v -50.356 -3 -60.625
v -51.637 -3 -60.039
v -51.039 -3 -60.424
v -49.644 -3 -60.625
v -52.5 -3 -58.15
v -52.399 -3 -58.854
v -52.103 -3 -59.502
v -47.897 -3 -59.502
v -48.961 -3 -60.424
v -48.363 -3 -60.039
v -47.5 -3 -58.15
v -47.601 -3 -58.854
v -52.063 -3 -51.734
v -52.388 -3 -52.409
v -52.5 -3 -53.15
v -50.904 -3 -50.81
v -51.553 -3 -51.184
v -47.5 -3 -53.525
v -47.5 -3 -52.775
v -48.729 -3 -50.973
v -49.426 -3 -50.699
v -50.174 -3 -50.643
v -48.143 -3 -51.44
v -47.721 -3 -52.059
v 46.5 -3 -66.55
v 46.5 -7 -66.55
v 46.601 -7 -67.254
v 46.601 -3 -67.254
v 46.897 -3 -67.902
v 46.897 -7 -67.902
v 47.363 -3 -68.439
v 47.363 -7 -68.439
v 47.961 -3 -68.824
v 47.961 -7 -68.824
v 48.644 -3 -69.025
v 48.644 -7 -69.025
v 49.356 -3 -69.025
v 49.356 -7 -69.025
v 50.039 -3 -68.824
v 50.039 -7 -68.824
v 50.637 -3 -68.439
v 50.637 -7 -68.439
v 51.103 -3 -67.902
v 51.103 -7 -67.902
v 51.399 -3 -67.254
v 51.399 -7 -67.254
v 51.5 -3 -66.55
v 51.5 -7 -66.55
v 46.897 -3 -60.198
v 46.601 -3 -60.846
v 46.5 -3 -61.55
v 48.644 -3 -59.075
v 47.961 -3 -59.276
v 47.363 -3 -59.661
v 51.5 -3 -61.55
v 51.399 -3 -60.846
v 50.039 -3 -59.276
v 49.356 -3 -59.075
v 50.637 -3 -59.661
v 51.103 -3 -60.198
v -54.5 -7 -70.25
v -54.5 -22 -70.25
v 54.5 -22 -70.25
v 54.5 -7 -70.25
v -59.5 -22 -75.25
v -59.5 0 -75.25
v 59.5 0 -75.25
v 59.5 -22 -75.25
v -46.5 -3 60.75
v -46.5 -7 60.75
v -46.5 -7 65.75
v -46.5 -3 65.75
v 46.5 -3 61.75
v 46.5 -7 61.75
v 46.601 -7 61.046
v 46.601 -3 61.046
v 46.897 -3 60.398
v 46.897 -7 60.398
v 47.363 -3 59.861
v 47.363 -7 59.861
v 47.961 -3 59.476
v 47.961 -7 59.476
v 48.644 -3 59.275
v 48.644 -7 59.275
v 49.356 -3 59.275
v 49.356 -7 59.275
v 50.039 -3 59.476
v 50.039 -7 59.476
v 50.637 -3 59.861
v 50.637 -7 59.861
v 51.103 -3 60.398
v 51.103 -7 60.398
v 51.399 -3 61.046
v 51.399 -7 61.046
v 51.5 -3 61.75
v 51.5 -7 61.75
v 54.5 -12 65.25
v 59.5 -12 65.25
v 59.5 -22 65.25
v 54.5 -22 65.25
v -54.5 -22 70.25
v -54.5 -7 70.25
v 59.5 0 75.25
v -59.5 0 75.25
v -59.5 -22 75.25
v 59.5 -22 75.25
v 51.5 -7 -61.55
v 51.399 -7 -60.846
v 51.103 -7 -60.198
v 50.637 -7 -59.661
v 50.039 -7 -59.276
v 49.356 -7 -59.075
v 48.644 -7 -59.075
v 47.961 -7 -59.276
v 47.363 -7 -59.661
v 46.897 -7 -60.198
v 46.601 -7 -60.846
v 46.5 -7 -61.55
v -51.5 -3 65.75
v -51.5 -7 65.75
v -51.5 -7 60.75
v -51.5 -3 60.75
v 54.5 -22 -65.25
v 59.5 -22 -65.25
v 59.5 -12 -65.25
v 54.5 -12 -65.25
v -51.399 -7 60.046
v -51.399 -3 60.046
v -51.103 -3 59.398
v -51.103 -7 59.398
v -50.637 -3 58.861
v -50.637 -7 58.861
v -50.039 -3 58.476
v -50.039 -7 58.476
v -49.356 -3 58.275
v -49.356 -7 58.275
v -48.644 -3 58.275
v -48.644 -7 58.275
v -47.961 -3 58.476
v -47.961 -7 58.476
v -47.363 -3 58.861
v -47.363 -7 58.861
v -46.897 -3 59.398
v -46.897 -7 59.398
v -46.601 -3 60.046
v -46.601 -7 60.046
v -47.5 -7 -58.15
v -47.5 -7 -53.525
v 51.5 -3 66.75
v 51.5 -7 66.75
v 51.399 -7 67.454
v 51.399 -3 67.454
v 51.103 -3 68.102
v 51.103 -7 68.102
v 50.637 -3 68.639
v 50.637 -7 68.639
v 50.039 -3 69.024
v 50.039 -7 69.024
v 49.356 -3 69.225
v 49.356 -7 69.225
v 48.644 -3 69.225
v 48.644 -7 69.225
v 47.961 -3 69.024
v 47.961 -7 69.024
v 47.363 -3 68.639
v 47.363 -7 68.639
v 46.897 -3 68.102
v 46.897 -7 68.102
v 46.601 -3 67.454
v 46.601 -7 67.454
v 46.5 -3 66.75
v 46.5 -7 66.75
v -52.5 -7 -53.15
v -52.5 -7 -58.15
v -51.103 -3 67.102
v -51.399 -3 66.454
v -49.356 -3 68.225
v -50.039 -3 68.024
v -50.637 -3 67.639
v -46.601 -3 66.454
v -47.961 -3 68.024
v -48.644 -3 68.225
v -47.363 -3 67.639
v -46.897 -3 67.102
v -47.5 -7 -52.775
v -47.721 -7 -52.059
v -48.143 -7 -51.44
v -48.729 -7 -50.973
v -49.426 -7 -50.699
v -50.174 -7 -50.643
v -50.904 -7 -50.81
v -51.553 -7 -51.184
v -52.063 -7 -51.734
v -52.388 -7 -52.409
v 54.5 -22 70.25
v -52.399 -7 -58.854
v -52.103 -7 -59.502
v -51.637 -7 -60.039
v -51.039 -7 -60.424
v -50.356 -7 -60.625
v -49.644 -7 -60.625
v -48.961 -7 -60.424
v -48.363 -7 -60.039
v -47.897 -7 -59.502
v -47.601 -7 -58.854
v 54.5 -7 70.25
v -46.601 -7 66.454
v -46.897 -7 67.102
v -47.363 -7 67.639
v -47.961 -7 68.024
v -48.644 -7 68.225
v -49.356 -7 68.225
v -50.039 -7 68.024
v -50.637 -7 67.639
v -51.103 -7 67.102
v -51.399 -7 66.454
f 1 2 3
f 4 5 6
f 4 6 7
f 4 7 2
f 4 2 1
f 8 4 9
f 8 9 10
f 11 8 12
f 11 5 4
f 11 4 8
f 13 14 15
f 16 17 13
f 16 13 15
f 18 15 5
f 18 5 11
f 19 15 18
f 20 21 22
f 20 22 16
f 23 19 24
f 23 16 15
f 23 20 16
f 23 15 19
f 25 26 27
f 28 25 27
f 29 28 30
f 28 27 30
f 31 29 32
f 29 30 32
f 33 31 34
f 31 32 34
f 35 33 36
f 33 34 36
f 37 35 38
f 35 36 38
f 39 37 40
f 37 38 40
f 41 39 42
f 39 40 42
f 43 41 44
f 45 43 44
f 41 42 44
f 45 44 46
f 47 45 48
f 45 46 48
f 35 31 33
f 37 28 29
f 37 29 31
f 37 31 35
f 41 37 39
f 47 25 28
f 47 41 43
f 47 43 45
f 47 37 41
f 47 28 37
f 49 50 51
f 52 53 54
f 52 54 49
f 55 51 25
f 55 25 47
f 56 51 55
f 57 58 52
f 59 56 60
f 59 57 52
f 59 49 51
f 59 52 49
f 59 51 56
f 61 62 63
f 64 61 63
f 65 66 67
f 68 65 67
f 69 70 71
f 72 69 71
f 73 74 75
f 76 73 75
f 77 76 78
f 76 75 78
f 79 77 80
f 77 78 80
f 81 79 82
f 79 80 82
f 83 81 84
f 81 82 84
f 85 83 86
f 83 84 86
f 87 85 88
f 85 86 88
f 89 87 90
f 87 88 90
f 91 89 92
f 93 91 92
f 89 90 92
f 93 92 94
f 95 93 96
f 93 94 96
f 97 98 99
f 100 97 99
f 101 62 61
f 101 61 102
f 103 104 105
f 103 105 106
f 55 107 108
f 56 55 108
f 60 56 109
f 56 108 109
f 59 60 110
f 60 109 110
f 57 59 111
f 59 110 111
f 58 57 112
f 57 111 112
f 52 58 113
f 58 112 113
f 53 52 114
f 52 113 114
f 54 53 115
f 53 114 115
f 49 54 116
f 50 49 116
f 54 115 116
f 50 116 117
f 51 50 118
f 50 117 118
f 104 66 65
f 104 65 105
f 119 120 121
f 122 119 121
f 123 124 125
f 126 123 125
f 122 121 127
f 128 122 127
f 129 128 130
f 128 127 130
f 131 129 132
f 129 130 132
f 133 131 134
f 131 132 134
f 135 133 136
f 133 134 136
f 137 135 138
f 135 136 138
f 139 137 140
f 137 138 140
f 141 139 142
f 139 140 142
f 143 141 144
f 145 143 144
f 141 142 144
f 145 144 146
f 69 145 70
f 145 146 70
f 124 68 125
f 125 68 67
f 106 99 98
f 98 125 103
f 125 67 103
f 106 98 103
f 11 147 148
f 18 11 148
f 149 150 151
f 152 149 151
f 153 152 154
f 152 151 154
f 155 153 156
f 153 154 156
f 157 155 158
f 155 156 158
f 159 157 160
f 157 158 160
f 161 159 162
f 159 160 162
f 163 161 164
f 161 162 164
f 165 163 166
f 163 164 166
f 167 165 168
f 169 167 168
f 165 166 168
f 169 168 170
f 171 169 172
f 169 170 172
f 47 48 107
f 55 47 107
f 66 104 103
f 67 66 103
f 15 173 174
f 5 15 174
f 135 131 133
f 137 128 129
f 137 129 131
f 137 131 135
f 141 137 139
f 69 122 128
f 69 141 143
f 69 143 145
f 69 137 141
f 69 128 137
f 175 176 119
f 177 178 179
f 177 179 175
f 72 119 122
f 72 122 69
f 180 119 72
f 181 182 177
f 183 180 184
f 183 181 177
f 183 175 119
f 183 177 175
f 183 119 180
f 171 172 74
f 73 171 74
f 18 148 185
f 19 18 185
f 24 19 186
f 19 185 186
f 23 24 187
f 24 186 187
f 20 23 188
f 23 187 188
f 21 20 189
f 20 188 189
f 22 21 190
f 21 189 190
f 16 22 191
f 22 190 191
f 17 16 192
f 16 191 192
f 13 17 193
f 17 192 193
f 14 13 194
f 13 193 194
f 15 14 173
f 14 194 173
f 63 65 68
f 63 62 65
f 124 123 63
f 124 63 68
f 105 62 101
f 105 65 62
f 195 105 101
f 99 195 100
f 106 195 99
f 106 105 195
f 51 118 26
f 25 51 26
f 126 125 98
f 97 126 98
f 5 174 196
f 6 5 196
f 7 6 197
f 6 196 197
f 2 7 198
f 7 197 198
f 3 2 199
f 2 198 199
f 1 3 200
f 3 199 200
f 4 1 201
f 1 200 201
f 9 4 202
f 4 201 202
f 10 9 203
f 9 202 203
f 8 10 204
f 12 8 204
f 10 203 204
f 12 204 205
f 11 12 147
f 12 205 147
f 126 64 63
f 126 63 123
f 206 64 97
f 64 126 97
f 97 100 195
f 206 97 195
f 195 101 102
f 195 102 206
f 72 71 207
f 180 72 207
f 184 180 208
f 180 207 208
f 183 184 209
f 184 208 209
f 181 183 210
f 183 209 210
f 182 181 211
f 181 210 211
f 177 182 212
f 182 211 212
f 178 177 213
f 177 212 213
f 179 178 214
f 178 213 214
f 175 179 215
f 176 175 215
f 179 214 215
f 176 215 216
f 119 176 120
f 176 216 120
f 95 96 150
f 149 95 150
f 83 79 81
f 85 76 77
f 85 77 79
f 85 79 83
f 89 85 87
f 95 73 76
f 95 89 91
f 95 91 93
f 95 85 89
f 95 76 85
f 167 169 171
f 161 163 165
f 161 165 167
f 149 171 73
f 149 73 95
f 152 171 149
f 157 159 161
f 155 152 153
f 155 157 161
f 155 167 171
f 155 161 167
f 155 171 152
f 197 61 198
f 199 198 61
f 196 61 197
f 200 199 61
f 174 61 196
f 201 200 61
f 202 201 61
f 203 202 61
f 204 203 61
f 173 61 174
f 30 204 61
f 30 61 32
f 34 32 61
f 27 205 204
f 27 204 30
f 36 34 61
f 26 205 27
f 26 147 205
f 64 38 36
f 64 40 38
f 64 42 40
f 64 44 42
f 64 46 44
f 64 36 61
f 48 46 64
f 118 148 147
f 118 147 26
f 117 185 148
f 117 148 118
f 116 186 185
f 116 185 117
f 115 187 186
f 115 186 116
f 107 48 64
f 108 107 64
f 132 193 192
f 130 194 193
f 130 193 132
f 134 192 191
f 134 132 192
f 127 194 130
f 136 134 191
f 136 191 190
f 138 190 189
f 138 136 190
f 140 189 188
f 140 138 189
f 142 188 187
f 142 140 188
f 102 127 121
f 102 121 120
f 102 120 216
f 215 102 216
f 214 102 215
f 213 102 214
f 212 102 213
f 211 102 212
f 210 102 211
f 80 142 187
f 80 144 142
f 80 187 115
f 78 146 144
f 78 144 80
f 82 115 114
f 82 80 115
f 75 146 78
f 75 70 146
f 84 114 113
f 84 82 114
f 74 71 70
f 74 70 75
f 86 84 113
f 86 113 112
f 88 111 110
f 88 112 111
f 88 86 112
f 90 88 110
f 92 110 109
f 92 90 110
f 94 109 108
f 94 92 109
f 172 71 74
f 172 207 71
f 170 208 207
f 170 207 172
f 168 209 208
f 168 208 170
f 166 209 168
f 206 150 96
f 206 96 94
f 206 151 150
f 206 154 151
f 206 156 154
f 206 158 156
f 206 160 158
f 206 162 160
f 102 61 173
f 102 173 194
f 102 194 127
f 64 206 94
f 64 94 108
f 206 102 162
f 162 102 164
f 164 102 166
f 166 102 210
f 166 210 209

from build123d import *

# Parameters (mm, degrees)
F0_W     = 119
F0_H     = 150.5
F1_DEPTH = 22
F2_W     = 109
F2_H     = 140.5
F3_DEPTH = 15
F5_DEPTH = 25
F7_DEPTH = 4


with BuildPart() as f1:
    # F0 (on Front) → F1 (new body)
    with BuildSketch(Plane.XZ):
        Rectangle(F0_W, F0_H)
    extrude(amount=F1_DEPTH)

    # F2 (on face) → F3 (cut)
    with BuildSketch(Plane.XZ.offset(22)):
        Rectangle(F2_W, F2_H)
    extrude(amount=-F3_DEPTH, mode=Mode.SUBTRACT)

    # F4 (on face) → F5 (cut)
    with BuildSketch(Plane.YZ.offset(59.5)):
        Polygon((-22, 65.25), (-22, 0), (-22, -65.25), (-12, -65.25), (-12, 0), (-12, 65.25), align=None)
    extrude(amount=-F5_DEPTH, mode=Mode.SUBTRACT)

    # F6 (on face) → F7 (cut)
    with BuildSketch(Plane.XZ.offset(7)):
        with BuildLine():
            Line((-46.5, 60.75), (-46.5, 65.75))
            ThreePointArc((-46.5, 65.75), (-49, 68.25), (-51.5, 65.75))
            Line((-51.5, 65.75), (-51.5, 60.75))
            ThreePointArc((-51.5, 60.75), (-49, 58.25), (-46.5, 60.75))
        make_face()
        with BuildLine():
            Line((51.5, 61.75), (51.5, 66.75))
            ThreePointArc((51.5, 66.75), (49, 69.25), (46.5, 66.75))
            Line((46.5, 66.75), (46.5, 61.75))
            ThreePointArc((46.5, 61.75), (49, 59.25), (51.5, 61.75))
        make_face()
        with BuildLine():
            Line((46.5, -61.55), (46.5, -66.55))
            ThreePointArc((46.5, -66.55), (49, -69.05), (51.5, -66.55))
            Line((51.5, -66.55), (51.5, -61.55))
            ThreePointArc((51.5, -61.55), (49, -59.05), (46.5, -61.55))
        make_face()
        with BuildLine():
            Line((-52.5, -53.15), (-52.5, -58.15))
            ThreePointArc((-52.5, -58.15), (-50, -60.65), (-47.5, -58.15))
            Line((-47.5, -58.15), (-47.5, -53.524891))
            ThreePointArc((-47.5, -53.524891), (-49.797974, -50.642983), (-52.5, -53.15))
        make_face()
    extrude(amount=-F7_DEPTH, mode=Mode.SUBTRACT)


solid = f1.part
